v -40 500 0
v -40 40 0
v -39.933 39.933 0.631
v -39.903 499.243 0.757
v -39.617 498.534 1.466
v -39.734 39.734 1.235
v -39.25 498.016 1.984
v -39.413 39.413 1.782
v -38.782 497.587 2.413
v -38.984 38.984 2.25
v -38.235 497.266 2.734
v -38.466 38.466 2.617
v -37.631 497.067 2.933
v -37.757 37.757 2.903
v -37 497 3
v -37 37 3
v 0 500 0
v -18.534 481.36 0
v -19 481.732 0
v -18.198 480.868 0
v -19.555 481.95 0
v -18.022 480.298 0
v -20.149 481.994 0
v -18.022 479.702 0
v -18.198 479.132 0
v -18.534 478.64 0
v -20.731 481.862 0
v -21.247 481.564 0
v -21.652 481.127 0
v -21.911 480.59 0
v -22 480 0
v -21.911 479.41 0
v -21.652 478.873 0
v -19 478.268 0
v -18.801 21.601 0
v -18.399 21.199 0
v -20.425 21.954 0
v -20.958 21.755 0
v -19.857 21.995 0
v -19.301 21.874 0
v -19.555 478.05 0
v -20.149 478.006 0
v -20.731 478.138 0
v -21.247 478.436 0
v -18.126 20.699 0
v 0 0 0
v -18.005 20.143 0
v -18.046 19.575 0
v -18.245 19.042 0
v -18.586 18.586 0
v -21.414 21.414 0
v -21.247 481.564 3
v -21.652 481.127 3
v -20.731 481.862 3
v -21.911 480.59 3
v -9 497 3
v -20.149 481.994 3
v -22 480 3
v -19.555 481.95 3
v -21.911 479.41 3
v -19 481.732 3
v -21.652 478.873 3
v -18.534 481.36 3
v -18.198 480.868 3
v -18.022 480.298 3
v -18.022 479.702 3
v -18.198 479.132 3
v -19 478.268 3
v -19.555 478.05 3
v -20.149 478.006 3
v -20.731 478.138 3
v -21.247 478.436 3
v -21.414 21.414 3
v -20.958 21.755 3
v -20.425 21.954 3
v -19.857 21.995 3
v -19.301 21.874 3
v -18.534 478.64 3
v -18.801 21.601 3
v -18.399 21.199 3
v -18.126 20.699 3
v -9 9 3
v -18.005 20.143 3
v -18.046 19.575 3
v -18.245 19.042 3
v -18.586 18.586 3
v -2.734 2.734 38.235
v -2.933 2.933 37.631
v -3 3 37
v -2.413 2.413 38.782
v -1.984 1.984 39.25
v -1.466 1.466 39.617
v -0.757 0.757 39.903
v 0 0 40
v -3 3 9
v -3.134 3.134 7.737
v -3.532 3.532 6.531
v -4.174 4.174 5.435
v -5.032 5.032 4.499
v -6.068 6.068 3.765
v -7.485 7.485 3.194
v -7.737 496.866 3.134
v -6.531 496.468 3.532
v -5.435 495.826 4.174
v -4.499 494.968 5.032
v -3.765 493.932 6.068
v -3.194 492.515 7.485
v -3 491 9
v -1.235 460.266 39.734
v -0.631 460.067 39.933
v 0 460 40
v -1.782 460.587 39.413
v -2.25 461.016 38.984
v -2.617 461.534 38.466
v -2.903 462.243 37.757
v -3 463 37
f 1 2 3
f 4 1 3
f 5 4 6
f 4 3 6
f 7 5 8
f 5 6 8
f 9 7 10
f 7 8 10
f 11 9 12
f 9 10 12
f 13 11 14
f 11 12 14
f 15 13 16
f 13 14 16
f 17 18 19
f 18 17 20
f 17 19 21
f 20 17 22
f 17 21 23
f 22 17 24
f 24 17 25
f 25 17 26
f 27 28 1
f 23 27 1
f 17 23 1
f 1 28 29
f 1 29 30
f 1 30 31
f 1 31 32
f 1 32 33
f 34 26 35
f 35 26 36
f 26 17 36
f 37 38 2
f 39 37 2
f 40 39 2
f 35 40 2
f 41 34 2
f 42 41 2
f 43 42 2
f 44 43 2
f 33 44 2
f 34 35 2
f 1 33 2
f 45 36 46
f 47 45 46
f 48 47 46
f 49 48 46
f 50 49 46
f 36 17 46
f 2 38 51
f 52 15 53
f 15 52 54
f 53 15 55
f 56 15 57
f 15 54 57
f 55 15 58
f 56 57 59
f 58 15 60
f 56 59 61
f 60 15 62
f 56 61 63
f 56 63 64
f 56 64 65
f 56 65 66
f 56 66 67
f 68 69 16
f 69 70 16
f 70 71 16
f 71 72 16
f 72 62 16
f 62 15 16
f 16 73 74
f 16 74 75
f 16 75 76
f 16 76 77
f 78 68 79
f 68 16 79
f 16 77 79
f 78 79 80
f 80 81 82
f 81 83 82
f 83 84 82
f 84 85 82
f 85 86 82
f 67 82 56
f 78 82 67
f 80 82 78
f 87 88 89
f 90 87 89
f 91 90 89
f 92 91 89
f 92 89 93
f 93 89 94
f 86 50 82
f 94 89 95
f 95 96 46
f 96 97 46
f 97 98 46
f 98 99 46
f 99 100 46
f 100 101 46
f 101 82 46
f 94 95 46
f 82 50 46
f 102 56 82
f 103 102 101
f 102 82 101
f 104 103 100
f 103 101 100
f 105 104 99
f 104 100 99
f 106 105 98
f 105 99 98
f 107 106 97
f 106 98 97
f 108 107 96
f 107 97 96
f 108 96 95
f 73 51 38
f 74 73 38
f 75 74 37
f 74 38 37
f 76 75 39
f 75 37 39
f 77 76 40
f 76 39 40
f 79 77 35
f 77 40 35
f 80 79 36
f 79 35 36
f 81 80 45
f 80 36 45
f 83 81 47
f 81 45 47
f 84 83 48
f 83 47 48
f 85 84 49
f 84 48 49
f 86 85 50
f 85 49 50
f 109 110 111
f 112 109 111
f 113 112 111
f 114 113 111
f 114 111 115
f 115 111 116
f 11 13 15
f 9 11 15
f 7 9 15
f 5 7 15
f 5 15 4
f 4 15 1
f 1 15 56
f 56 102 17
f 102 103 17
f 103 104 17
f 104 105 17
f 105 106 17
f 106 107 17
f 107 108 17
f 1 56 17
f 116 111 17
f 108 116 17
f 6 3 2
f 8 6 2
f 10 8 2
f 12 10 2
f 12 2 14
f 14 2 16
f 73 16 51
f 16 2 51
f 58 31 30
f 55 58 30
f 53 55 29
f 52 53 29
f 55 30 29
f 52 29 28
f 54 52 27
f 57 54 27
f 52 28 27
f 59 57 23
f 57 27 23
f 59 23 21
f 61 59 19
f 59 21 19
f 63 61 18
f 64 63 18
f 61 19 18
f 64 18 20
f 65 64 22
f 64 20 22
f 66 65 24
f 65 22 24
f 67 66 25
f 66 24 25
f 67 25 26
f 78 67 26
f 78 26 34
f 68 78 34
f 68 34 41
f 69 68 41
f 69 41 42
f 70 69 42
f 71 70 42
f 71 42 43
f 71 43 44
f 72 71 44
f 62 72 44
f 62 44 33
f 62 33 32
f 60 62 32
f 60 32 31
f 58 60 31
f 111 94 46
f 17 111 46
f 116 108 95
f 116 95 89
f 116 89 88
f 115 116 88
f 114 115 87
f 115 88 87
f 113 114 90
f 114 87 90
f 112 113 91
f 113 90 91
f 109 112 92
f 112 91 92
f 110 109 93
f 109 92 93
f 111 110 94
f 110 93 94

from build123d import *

# Parameters (mm, degrees)
L_ANGLE_EQUAL_40X40X3_1_DEPTH = 500
CUT_EXTRUDE1_DEPTH            = 504.189825016
CUT_EXTRUDE2_DEPTH            = 504.189825016
SKETCH16_R                    = 2
CUT_EXTRUDE3_DEPTH            = 10


with BuildPart() as part:
    # Sketch11 → L angle (equal) 40X40X3(1) (new body)
    with BuildSketch(Plane(origin=(0, 0, 0), x_dir=(-1, 0, 0), z_dir=(0, 1, 0))):
        with BuildLine():
            Line((0, 40), (0, 0))
            Line((0, 0), (40, 0))
            ThreePointArc((40, 0), (39.121320344, 2.121320344), (37, 3))
            Line((37, 3), (9, 3))
            ThreePointArc((9, 3), (4.757359313, 4.757359313), (3, 9))
            Line((3, 9), (3, 37))
            ThreePointArc((3, 37), (2.121320344, 39.121320344), (0, 40))
        make_face()
    extrude(amount=L_ANGLE_EQUAL_40X40X3_1_DEPTH)

    # Sketch12 → Cut-Extrude1 (cut, through all)
    with BuildSketch(Plane(origin=(0, 0, 0), x_dir=(0, 0, -1), z_dir=(1, 0, 0))):
        Polygon((0, 500), (-40, 500), (-40, 460), align=None)
    extrude(amount=-CUT_EXTRUDE1_DEPTH, mode=Mode.SUBTRACT)

    # Sketch14 → Cut-Extrude2 (cut, through all)
    with BuildSketch(Plane(origin=(0, 0, 0), x_dir=(-1, 0, 0), z_dir=(0, 0, -1))):
        Polygon((40, 40), (0, 0), (40, 0), align=None)
    extrude(amount=-CUT_EXTRUDE2_DEPTH, mode=Mode.SUBTRACT)

    # Sketch16 → Cut-Extrude3 (cut)
    with BuildSketch(Plane(origin=(0, 0, 0), x_dir=(-1, 0, 0), z_dir=(0, 0, -1))):
        with Locations((20, 480)):
            Circle(SKETCH16_R)
        with Locations((20, 20)):
            Circle(SKETCH16_R)
    extrude(amount=-CUT_EXTRUDE3_DEPTH, mode=Mode.SUBTRACT)


solid = part.part
